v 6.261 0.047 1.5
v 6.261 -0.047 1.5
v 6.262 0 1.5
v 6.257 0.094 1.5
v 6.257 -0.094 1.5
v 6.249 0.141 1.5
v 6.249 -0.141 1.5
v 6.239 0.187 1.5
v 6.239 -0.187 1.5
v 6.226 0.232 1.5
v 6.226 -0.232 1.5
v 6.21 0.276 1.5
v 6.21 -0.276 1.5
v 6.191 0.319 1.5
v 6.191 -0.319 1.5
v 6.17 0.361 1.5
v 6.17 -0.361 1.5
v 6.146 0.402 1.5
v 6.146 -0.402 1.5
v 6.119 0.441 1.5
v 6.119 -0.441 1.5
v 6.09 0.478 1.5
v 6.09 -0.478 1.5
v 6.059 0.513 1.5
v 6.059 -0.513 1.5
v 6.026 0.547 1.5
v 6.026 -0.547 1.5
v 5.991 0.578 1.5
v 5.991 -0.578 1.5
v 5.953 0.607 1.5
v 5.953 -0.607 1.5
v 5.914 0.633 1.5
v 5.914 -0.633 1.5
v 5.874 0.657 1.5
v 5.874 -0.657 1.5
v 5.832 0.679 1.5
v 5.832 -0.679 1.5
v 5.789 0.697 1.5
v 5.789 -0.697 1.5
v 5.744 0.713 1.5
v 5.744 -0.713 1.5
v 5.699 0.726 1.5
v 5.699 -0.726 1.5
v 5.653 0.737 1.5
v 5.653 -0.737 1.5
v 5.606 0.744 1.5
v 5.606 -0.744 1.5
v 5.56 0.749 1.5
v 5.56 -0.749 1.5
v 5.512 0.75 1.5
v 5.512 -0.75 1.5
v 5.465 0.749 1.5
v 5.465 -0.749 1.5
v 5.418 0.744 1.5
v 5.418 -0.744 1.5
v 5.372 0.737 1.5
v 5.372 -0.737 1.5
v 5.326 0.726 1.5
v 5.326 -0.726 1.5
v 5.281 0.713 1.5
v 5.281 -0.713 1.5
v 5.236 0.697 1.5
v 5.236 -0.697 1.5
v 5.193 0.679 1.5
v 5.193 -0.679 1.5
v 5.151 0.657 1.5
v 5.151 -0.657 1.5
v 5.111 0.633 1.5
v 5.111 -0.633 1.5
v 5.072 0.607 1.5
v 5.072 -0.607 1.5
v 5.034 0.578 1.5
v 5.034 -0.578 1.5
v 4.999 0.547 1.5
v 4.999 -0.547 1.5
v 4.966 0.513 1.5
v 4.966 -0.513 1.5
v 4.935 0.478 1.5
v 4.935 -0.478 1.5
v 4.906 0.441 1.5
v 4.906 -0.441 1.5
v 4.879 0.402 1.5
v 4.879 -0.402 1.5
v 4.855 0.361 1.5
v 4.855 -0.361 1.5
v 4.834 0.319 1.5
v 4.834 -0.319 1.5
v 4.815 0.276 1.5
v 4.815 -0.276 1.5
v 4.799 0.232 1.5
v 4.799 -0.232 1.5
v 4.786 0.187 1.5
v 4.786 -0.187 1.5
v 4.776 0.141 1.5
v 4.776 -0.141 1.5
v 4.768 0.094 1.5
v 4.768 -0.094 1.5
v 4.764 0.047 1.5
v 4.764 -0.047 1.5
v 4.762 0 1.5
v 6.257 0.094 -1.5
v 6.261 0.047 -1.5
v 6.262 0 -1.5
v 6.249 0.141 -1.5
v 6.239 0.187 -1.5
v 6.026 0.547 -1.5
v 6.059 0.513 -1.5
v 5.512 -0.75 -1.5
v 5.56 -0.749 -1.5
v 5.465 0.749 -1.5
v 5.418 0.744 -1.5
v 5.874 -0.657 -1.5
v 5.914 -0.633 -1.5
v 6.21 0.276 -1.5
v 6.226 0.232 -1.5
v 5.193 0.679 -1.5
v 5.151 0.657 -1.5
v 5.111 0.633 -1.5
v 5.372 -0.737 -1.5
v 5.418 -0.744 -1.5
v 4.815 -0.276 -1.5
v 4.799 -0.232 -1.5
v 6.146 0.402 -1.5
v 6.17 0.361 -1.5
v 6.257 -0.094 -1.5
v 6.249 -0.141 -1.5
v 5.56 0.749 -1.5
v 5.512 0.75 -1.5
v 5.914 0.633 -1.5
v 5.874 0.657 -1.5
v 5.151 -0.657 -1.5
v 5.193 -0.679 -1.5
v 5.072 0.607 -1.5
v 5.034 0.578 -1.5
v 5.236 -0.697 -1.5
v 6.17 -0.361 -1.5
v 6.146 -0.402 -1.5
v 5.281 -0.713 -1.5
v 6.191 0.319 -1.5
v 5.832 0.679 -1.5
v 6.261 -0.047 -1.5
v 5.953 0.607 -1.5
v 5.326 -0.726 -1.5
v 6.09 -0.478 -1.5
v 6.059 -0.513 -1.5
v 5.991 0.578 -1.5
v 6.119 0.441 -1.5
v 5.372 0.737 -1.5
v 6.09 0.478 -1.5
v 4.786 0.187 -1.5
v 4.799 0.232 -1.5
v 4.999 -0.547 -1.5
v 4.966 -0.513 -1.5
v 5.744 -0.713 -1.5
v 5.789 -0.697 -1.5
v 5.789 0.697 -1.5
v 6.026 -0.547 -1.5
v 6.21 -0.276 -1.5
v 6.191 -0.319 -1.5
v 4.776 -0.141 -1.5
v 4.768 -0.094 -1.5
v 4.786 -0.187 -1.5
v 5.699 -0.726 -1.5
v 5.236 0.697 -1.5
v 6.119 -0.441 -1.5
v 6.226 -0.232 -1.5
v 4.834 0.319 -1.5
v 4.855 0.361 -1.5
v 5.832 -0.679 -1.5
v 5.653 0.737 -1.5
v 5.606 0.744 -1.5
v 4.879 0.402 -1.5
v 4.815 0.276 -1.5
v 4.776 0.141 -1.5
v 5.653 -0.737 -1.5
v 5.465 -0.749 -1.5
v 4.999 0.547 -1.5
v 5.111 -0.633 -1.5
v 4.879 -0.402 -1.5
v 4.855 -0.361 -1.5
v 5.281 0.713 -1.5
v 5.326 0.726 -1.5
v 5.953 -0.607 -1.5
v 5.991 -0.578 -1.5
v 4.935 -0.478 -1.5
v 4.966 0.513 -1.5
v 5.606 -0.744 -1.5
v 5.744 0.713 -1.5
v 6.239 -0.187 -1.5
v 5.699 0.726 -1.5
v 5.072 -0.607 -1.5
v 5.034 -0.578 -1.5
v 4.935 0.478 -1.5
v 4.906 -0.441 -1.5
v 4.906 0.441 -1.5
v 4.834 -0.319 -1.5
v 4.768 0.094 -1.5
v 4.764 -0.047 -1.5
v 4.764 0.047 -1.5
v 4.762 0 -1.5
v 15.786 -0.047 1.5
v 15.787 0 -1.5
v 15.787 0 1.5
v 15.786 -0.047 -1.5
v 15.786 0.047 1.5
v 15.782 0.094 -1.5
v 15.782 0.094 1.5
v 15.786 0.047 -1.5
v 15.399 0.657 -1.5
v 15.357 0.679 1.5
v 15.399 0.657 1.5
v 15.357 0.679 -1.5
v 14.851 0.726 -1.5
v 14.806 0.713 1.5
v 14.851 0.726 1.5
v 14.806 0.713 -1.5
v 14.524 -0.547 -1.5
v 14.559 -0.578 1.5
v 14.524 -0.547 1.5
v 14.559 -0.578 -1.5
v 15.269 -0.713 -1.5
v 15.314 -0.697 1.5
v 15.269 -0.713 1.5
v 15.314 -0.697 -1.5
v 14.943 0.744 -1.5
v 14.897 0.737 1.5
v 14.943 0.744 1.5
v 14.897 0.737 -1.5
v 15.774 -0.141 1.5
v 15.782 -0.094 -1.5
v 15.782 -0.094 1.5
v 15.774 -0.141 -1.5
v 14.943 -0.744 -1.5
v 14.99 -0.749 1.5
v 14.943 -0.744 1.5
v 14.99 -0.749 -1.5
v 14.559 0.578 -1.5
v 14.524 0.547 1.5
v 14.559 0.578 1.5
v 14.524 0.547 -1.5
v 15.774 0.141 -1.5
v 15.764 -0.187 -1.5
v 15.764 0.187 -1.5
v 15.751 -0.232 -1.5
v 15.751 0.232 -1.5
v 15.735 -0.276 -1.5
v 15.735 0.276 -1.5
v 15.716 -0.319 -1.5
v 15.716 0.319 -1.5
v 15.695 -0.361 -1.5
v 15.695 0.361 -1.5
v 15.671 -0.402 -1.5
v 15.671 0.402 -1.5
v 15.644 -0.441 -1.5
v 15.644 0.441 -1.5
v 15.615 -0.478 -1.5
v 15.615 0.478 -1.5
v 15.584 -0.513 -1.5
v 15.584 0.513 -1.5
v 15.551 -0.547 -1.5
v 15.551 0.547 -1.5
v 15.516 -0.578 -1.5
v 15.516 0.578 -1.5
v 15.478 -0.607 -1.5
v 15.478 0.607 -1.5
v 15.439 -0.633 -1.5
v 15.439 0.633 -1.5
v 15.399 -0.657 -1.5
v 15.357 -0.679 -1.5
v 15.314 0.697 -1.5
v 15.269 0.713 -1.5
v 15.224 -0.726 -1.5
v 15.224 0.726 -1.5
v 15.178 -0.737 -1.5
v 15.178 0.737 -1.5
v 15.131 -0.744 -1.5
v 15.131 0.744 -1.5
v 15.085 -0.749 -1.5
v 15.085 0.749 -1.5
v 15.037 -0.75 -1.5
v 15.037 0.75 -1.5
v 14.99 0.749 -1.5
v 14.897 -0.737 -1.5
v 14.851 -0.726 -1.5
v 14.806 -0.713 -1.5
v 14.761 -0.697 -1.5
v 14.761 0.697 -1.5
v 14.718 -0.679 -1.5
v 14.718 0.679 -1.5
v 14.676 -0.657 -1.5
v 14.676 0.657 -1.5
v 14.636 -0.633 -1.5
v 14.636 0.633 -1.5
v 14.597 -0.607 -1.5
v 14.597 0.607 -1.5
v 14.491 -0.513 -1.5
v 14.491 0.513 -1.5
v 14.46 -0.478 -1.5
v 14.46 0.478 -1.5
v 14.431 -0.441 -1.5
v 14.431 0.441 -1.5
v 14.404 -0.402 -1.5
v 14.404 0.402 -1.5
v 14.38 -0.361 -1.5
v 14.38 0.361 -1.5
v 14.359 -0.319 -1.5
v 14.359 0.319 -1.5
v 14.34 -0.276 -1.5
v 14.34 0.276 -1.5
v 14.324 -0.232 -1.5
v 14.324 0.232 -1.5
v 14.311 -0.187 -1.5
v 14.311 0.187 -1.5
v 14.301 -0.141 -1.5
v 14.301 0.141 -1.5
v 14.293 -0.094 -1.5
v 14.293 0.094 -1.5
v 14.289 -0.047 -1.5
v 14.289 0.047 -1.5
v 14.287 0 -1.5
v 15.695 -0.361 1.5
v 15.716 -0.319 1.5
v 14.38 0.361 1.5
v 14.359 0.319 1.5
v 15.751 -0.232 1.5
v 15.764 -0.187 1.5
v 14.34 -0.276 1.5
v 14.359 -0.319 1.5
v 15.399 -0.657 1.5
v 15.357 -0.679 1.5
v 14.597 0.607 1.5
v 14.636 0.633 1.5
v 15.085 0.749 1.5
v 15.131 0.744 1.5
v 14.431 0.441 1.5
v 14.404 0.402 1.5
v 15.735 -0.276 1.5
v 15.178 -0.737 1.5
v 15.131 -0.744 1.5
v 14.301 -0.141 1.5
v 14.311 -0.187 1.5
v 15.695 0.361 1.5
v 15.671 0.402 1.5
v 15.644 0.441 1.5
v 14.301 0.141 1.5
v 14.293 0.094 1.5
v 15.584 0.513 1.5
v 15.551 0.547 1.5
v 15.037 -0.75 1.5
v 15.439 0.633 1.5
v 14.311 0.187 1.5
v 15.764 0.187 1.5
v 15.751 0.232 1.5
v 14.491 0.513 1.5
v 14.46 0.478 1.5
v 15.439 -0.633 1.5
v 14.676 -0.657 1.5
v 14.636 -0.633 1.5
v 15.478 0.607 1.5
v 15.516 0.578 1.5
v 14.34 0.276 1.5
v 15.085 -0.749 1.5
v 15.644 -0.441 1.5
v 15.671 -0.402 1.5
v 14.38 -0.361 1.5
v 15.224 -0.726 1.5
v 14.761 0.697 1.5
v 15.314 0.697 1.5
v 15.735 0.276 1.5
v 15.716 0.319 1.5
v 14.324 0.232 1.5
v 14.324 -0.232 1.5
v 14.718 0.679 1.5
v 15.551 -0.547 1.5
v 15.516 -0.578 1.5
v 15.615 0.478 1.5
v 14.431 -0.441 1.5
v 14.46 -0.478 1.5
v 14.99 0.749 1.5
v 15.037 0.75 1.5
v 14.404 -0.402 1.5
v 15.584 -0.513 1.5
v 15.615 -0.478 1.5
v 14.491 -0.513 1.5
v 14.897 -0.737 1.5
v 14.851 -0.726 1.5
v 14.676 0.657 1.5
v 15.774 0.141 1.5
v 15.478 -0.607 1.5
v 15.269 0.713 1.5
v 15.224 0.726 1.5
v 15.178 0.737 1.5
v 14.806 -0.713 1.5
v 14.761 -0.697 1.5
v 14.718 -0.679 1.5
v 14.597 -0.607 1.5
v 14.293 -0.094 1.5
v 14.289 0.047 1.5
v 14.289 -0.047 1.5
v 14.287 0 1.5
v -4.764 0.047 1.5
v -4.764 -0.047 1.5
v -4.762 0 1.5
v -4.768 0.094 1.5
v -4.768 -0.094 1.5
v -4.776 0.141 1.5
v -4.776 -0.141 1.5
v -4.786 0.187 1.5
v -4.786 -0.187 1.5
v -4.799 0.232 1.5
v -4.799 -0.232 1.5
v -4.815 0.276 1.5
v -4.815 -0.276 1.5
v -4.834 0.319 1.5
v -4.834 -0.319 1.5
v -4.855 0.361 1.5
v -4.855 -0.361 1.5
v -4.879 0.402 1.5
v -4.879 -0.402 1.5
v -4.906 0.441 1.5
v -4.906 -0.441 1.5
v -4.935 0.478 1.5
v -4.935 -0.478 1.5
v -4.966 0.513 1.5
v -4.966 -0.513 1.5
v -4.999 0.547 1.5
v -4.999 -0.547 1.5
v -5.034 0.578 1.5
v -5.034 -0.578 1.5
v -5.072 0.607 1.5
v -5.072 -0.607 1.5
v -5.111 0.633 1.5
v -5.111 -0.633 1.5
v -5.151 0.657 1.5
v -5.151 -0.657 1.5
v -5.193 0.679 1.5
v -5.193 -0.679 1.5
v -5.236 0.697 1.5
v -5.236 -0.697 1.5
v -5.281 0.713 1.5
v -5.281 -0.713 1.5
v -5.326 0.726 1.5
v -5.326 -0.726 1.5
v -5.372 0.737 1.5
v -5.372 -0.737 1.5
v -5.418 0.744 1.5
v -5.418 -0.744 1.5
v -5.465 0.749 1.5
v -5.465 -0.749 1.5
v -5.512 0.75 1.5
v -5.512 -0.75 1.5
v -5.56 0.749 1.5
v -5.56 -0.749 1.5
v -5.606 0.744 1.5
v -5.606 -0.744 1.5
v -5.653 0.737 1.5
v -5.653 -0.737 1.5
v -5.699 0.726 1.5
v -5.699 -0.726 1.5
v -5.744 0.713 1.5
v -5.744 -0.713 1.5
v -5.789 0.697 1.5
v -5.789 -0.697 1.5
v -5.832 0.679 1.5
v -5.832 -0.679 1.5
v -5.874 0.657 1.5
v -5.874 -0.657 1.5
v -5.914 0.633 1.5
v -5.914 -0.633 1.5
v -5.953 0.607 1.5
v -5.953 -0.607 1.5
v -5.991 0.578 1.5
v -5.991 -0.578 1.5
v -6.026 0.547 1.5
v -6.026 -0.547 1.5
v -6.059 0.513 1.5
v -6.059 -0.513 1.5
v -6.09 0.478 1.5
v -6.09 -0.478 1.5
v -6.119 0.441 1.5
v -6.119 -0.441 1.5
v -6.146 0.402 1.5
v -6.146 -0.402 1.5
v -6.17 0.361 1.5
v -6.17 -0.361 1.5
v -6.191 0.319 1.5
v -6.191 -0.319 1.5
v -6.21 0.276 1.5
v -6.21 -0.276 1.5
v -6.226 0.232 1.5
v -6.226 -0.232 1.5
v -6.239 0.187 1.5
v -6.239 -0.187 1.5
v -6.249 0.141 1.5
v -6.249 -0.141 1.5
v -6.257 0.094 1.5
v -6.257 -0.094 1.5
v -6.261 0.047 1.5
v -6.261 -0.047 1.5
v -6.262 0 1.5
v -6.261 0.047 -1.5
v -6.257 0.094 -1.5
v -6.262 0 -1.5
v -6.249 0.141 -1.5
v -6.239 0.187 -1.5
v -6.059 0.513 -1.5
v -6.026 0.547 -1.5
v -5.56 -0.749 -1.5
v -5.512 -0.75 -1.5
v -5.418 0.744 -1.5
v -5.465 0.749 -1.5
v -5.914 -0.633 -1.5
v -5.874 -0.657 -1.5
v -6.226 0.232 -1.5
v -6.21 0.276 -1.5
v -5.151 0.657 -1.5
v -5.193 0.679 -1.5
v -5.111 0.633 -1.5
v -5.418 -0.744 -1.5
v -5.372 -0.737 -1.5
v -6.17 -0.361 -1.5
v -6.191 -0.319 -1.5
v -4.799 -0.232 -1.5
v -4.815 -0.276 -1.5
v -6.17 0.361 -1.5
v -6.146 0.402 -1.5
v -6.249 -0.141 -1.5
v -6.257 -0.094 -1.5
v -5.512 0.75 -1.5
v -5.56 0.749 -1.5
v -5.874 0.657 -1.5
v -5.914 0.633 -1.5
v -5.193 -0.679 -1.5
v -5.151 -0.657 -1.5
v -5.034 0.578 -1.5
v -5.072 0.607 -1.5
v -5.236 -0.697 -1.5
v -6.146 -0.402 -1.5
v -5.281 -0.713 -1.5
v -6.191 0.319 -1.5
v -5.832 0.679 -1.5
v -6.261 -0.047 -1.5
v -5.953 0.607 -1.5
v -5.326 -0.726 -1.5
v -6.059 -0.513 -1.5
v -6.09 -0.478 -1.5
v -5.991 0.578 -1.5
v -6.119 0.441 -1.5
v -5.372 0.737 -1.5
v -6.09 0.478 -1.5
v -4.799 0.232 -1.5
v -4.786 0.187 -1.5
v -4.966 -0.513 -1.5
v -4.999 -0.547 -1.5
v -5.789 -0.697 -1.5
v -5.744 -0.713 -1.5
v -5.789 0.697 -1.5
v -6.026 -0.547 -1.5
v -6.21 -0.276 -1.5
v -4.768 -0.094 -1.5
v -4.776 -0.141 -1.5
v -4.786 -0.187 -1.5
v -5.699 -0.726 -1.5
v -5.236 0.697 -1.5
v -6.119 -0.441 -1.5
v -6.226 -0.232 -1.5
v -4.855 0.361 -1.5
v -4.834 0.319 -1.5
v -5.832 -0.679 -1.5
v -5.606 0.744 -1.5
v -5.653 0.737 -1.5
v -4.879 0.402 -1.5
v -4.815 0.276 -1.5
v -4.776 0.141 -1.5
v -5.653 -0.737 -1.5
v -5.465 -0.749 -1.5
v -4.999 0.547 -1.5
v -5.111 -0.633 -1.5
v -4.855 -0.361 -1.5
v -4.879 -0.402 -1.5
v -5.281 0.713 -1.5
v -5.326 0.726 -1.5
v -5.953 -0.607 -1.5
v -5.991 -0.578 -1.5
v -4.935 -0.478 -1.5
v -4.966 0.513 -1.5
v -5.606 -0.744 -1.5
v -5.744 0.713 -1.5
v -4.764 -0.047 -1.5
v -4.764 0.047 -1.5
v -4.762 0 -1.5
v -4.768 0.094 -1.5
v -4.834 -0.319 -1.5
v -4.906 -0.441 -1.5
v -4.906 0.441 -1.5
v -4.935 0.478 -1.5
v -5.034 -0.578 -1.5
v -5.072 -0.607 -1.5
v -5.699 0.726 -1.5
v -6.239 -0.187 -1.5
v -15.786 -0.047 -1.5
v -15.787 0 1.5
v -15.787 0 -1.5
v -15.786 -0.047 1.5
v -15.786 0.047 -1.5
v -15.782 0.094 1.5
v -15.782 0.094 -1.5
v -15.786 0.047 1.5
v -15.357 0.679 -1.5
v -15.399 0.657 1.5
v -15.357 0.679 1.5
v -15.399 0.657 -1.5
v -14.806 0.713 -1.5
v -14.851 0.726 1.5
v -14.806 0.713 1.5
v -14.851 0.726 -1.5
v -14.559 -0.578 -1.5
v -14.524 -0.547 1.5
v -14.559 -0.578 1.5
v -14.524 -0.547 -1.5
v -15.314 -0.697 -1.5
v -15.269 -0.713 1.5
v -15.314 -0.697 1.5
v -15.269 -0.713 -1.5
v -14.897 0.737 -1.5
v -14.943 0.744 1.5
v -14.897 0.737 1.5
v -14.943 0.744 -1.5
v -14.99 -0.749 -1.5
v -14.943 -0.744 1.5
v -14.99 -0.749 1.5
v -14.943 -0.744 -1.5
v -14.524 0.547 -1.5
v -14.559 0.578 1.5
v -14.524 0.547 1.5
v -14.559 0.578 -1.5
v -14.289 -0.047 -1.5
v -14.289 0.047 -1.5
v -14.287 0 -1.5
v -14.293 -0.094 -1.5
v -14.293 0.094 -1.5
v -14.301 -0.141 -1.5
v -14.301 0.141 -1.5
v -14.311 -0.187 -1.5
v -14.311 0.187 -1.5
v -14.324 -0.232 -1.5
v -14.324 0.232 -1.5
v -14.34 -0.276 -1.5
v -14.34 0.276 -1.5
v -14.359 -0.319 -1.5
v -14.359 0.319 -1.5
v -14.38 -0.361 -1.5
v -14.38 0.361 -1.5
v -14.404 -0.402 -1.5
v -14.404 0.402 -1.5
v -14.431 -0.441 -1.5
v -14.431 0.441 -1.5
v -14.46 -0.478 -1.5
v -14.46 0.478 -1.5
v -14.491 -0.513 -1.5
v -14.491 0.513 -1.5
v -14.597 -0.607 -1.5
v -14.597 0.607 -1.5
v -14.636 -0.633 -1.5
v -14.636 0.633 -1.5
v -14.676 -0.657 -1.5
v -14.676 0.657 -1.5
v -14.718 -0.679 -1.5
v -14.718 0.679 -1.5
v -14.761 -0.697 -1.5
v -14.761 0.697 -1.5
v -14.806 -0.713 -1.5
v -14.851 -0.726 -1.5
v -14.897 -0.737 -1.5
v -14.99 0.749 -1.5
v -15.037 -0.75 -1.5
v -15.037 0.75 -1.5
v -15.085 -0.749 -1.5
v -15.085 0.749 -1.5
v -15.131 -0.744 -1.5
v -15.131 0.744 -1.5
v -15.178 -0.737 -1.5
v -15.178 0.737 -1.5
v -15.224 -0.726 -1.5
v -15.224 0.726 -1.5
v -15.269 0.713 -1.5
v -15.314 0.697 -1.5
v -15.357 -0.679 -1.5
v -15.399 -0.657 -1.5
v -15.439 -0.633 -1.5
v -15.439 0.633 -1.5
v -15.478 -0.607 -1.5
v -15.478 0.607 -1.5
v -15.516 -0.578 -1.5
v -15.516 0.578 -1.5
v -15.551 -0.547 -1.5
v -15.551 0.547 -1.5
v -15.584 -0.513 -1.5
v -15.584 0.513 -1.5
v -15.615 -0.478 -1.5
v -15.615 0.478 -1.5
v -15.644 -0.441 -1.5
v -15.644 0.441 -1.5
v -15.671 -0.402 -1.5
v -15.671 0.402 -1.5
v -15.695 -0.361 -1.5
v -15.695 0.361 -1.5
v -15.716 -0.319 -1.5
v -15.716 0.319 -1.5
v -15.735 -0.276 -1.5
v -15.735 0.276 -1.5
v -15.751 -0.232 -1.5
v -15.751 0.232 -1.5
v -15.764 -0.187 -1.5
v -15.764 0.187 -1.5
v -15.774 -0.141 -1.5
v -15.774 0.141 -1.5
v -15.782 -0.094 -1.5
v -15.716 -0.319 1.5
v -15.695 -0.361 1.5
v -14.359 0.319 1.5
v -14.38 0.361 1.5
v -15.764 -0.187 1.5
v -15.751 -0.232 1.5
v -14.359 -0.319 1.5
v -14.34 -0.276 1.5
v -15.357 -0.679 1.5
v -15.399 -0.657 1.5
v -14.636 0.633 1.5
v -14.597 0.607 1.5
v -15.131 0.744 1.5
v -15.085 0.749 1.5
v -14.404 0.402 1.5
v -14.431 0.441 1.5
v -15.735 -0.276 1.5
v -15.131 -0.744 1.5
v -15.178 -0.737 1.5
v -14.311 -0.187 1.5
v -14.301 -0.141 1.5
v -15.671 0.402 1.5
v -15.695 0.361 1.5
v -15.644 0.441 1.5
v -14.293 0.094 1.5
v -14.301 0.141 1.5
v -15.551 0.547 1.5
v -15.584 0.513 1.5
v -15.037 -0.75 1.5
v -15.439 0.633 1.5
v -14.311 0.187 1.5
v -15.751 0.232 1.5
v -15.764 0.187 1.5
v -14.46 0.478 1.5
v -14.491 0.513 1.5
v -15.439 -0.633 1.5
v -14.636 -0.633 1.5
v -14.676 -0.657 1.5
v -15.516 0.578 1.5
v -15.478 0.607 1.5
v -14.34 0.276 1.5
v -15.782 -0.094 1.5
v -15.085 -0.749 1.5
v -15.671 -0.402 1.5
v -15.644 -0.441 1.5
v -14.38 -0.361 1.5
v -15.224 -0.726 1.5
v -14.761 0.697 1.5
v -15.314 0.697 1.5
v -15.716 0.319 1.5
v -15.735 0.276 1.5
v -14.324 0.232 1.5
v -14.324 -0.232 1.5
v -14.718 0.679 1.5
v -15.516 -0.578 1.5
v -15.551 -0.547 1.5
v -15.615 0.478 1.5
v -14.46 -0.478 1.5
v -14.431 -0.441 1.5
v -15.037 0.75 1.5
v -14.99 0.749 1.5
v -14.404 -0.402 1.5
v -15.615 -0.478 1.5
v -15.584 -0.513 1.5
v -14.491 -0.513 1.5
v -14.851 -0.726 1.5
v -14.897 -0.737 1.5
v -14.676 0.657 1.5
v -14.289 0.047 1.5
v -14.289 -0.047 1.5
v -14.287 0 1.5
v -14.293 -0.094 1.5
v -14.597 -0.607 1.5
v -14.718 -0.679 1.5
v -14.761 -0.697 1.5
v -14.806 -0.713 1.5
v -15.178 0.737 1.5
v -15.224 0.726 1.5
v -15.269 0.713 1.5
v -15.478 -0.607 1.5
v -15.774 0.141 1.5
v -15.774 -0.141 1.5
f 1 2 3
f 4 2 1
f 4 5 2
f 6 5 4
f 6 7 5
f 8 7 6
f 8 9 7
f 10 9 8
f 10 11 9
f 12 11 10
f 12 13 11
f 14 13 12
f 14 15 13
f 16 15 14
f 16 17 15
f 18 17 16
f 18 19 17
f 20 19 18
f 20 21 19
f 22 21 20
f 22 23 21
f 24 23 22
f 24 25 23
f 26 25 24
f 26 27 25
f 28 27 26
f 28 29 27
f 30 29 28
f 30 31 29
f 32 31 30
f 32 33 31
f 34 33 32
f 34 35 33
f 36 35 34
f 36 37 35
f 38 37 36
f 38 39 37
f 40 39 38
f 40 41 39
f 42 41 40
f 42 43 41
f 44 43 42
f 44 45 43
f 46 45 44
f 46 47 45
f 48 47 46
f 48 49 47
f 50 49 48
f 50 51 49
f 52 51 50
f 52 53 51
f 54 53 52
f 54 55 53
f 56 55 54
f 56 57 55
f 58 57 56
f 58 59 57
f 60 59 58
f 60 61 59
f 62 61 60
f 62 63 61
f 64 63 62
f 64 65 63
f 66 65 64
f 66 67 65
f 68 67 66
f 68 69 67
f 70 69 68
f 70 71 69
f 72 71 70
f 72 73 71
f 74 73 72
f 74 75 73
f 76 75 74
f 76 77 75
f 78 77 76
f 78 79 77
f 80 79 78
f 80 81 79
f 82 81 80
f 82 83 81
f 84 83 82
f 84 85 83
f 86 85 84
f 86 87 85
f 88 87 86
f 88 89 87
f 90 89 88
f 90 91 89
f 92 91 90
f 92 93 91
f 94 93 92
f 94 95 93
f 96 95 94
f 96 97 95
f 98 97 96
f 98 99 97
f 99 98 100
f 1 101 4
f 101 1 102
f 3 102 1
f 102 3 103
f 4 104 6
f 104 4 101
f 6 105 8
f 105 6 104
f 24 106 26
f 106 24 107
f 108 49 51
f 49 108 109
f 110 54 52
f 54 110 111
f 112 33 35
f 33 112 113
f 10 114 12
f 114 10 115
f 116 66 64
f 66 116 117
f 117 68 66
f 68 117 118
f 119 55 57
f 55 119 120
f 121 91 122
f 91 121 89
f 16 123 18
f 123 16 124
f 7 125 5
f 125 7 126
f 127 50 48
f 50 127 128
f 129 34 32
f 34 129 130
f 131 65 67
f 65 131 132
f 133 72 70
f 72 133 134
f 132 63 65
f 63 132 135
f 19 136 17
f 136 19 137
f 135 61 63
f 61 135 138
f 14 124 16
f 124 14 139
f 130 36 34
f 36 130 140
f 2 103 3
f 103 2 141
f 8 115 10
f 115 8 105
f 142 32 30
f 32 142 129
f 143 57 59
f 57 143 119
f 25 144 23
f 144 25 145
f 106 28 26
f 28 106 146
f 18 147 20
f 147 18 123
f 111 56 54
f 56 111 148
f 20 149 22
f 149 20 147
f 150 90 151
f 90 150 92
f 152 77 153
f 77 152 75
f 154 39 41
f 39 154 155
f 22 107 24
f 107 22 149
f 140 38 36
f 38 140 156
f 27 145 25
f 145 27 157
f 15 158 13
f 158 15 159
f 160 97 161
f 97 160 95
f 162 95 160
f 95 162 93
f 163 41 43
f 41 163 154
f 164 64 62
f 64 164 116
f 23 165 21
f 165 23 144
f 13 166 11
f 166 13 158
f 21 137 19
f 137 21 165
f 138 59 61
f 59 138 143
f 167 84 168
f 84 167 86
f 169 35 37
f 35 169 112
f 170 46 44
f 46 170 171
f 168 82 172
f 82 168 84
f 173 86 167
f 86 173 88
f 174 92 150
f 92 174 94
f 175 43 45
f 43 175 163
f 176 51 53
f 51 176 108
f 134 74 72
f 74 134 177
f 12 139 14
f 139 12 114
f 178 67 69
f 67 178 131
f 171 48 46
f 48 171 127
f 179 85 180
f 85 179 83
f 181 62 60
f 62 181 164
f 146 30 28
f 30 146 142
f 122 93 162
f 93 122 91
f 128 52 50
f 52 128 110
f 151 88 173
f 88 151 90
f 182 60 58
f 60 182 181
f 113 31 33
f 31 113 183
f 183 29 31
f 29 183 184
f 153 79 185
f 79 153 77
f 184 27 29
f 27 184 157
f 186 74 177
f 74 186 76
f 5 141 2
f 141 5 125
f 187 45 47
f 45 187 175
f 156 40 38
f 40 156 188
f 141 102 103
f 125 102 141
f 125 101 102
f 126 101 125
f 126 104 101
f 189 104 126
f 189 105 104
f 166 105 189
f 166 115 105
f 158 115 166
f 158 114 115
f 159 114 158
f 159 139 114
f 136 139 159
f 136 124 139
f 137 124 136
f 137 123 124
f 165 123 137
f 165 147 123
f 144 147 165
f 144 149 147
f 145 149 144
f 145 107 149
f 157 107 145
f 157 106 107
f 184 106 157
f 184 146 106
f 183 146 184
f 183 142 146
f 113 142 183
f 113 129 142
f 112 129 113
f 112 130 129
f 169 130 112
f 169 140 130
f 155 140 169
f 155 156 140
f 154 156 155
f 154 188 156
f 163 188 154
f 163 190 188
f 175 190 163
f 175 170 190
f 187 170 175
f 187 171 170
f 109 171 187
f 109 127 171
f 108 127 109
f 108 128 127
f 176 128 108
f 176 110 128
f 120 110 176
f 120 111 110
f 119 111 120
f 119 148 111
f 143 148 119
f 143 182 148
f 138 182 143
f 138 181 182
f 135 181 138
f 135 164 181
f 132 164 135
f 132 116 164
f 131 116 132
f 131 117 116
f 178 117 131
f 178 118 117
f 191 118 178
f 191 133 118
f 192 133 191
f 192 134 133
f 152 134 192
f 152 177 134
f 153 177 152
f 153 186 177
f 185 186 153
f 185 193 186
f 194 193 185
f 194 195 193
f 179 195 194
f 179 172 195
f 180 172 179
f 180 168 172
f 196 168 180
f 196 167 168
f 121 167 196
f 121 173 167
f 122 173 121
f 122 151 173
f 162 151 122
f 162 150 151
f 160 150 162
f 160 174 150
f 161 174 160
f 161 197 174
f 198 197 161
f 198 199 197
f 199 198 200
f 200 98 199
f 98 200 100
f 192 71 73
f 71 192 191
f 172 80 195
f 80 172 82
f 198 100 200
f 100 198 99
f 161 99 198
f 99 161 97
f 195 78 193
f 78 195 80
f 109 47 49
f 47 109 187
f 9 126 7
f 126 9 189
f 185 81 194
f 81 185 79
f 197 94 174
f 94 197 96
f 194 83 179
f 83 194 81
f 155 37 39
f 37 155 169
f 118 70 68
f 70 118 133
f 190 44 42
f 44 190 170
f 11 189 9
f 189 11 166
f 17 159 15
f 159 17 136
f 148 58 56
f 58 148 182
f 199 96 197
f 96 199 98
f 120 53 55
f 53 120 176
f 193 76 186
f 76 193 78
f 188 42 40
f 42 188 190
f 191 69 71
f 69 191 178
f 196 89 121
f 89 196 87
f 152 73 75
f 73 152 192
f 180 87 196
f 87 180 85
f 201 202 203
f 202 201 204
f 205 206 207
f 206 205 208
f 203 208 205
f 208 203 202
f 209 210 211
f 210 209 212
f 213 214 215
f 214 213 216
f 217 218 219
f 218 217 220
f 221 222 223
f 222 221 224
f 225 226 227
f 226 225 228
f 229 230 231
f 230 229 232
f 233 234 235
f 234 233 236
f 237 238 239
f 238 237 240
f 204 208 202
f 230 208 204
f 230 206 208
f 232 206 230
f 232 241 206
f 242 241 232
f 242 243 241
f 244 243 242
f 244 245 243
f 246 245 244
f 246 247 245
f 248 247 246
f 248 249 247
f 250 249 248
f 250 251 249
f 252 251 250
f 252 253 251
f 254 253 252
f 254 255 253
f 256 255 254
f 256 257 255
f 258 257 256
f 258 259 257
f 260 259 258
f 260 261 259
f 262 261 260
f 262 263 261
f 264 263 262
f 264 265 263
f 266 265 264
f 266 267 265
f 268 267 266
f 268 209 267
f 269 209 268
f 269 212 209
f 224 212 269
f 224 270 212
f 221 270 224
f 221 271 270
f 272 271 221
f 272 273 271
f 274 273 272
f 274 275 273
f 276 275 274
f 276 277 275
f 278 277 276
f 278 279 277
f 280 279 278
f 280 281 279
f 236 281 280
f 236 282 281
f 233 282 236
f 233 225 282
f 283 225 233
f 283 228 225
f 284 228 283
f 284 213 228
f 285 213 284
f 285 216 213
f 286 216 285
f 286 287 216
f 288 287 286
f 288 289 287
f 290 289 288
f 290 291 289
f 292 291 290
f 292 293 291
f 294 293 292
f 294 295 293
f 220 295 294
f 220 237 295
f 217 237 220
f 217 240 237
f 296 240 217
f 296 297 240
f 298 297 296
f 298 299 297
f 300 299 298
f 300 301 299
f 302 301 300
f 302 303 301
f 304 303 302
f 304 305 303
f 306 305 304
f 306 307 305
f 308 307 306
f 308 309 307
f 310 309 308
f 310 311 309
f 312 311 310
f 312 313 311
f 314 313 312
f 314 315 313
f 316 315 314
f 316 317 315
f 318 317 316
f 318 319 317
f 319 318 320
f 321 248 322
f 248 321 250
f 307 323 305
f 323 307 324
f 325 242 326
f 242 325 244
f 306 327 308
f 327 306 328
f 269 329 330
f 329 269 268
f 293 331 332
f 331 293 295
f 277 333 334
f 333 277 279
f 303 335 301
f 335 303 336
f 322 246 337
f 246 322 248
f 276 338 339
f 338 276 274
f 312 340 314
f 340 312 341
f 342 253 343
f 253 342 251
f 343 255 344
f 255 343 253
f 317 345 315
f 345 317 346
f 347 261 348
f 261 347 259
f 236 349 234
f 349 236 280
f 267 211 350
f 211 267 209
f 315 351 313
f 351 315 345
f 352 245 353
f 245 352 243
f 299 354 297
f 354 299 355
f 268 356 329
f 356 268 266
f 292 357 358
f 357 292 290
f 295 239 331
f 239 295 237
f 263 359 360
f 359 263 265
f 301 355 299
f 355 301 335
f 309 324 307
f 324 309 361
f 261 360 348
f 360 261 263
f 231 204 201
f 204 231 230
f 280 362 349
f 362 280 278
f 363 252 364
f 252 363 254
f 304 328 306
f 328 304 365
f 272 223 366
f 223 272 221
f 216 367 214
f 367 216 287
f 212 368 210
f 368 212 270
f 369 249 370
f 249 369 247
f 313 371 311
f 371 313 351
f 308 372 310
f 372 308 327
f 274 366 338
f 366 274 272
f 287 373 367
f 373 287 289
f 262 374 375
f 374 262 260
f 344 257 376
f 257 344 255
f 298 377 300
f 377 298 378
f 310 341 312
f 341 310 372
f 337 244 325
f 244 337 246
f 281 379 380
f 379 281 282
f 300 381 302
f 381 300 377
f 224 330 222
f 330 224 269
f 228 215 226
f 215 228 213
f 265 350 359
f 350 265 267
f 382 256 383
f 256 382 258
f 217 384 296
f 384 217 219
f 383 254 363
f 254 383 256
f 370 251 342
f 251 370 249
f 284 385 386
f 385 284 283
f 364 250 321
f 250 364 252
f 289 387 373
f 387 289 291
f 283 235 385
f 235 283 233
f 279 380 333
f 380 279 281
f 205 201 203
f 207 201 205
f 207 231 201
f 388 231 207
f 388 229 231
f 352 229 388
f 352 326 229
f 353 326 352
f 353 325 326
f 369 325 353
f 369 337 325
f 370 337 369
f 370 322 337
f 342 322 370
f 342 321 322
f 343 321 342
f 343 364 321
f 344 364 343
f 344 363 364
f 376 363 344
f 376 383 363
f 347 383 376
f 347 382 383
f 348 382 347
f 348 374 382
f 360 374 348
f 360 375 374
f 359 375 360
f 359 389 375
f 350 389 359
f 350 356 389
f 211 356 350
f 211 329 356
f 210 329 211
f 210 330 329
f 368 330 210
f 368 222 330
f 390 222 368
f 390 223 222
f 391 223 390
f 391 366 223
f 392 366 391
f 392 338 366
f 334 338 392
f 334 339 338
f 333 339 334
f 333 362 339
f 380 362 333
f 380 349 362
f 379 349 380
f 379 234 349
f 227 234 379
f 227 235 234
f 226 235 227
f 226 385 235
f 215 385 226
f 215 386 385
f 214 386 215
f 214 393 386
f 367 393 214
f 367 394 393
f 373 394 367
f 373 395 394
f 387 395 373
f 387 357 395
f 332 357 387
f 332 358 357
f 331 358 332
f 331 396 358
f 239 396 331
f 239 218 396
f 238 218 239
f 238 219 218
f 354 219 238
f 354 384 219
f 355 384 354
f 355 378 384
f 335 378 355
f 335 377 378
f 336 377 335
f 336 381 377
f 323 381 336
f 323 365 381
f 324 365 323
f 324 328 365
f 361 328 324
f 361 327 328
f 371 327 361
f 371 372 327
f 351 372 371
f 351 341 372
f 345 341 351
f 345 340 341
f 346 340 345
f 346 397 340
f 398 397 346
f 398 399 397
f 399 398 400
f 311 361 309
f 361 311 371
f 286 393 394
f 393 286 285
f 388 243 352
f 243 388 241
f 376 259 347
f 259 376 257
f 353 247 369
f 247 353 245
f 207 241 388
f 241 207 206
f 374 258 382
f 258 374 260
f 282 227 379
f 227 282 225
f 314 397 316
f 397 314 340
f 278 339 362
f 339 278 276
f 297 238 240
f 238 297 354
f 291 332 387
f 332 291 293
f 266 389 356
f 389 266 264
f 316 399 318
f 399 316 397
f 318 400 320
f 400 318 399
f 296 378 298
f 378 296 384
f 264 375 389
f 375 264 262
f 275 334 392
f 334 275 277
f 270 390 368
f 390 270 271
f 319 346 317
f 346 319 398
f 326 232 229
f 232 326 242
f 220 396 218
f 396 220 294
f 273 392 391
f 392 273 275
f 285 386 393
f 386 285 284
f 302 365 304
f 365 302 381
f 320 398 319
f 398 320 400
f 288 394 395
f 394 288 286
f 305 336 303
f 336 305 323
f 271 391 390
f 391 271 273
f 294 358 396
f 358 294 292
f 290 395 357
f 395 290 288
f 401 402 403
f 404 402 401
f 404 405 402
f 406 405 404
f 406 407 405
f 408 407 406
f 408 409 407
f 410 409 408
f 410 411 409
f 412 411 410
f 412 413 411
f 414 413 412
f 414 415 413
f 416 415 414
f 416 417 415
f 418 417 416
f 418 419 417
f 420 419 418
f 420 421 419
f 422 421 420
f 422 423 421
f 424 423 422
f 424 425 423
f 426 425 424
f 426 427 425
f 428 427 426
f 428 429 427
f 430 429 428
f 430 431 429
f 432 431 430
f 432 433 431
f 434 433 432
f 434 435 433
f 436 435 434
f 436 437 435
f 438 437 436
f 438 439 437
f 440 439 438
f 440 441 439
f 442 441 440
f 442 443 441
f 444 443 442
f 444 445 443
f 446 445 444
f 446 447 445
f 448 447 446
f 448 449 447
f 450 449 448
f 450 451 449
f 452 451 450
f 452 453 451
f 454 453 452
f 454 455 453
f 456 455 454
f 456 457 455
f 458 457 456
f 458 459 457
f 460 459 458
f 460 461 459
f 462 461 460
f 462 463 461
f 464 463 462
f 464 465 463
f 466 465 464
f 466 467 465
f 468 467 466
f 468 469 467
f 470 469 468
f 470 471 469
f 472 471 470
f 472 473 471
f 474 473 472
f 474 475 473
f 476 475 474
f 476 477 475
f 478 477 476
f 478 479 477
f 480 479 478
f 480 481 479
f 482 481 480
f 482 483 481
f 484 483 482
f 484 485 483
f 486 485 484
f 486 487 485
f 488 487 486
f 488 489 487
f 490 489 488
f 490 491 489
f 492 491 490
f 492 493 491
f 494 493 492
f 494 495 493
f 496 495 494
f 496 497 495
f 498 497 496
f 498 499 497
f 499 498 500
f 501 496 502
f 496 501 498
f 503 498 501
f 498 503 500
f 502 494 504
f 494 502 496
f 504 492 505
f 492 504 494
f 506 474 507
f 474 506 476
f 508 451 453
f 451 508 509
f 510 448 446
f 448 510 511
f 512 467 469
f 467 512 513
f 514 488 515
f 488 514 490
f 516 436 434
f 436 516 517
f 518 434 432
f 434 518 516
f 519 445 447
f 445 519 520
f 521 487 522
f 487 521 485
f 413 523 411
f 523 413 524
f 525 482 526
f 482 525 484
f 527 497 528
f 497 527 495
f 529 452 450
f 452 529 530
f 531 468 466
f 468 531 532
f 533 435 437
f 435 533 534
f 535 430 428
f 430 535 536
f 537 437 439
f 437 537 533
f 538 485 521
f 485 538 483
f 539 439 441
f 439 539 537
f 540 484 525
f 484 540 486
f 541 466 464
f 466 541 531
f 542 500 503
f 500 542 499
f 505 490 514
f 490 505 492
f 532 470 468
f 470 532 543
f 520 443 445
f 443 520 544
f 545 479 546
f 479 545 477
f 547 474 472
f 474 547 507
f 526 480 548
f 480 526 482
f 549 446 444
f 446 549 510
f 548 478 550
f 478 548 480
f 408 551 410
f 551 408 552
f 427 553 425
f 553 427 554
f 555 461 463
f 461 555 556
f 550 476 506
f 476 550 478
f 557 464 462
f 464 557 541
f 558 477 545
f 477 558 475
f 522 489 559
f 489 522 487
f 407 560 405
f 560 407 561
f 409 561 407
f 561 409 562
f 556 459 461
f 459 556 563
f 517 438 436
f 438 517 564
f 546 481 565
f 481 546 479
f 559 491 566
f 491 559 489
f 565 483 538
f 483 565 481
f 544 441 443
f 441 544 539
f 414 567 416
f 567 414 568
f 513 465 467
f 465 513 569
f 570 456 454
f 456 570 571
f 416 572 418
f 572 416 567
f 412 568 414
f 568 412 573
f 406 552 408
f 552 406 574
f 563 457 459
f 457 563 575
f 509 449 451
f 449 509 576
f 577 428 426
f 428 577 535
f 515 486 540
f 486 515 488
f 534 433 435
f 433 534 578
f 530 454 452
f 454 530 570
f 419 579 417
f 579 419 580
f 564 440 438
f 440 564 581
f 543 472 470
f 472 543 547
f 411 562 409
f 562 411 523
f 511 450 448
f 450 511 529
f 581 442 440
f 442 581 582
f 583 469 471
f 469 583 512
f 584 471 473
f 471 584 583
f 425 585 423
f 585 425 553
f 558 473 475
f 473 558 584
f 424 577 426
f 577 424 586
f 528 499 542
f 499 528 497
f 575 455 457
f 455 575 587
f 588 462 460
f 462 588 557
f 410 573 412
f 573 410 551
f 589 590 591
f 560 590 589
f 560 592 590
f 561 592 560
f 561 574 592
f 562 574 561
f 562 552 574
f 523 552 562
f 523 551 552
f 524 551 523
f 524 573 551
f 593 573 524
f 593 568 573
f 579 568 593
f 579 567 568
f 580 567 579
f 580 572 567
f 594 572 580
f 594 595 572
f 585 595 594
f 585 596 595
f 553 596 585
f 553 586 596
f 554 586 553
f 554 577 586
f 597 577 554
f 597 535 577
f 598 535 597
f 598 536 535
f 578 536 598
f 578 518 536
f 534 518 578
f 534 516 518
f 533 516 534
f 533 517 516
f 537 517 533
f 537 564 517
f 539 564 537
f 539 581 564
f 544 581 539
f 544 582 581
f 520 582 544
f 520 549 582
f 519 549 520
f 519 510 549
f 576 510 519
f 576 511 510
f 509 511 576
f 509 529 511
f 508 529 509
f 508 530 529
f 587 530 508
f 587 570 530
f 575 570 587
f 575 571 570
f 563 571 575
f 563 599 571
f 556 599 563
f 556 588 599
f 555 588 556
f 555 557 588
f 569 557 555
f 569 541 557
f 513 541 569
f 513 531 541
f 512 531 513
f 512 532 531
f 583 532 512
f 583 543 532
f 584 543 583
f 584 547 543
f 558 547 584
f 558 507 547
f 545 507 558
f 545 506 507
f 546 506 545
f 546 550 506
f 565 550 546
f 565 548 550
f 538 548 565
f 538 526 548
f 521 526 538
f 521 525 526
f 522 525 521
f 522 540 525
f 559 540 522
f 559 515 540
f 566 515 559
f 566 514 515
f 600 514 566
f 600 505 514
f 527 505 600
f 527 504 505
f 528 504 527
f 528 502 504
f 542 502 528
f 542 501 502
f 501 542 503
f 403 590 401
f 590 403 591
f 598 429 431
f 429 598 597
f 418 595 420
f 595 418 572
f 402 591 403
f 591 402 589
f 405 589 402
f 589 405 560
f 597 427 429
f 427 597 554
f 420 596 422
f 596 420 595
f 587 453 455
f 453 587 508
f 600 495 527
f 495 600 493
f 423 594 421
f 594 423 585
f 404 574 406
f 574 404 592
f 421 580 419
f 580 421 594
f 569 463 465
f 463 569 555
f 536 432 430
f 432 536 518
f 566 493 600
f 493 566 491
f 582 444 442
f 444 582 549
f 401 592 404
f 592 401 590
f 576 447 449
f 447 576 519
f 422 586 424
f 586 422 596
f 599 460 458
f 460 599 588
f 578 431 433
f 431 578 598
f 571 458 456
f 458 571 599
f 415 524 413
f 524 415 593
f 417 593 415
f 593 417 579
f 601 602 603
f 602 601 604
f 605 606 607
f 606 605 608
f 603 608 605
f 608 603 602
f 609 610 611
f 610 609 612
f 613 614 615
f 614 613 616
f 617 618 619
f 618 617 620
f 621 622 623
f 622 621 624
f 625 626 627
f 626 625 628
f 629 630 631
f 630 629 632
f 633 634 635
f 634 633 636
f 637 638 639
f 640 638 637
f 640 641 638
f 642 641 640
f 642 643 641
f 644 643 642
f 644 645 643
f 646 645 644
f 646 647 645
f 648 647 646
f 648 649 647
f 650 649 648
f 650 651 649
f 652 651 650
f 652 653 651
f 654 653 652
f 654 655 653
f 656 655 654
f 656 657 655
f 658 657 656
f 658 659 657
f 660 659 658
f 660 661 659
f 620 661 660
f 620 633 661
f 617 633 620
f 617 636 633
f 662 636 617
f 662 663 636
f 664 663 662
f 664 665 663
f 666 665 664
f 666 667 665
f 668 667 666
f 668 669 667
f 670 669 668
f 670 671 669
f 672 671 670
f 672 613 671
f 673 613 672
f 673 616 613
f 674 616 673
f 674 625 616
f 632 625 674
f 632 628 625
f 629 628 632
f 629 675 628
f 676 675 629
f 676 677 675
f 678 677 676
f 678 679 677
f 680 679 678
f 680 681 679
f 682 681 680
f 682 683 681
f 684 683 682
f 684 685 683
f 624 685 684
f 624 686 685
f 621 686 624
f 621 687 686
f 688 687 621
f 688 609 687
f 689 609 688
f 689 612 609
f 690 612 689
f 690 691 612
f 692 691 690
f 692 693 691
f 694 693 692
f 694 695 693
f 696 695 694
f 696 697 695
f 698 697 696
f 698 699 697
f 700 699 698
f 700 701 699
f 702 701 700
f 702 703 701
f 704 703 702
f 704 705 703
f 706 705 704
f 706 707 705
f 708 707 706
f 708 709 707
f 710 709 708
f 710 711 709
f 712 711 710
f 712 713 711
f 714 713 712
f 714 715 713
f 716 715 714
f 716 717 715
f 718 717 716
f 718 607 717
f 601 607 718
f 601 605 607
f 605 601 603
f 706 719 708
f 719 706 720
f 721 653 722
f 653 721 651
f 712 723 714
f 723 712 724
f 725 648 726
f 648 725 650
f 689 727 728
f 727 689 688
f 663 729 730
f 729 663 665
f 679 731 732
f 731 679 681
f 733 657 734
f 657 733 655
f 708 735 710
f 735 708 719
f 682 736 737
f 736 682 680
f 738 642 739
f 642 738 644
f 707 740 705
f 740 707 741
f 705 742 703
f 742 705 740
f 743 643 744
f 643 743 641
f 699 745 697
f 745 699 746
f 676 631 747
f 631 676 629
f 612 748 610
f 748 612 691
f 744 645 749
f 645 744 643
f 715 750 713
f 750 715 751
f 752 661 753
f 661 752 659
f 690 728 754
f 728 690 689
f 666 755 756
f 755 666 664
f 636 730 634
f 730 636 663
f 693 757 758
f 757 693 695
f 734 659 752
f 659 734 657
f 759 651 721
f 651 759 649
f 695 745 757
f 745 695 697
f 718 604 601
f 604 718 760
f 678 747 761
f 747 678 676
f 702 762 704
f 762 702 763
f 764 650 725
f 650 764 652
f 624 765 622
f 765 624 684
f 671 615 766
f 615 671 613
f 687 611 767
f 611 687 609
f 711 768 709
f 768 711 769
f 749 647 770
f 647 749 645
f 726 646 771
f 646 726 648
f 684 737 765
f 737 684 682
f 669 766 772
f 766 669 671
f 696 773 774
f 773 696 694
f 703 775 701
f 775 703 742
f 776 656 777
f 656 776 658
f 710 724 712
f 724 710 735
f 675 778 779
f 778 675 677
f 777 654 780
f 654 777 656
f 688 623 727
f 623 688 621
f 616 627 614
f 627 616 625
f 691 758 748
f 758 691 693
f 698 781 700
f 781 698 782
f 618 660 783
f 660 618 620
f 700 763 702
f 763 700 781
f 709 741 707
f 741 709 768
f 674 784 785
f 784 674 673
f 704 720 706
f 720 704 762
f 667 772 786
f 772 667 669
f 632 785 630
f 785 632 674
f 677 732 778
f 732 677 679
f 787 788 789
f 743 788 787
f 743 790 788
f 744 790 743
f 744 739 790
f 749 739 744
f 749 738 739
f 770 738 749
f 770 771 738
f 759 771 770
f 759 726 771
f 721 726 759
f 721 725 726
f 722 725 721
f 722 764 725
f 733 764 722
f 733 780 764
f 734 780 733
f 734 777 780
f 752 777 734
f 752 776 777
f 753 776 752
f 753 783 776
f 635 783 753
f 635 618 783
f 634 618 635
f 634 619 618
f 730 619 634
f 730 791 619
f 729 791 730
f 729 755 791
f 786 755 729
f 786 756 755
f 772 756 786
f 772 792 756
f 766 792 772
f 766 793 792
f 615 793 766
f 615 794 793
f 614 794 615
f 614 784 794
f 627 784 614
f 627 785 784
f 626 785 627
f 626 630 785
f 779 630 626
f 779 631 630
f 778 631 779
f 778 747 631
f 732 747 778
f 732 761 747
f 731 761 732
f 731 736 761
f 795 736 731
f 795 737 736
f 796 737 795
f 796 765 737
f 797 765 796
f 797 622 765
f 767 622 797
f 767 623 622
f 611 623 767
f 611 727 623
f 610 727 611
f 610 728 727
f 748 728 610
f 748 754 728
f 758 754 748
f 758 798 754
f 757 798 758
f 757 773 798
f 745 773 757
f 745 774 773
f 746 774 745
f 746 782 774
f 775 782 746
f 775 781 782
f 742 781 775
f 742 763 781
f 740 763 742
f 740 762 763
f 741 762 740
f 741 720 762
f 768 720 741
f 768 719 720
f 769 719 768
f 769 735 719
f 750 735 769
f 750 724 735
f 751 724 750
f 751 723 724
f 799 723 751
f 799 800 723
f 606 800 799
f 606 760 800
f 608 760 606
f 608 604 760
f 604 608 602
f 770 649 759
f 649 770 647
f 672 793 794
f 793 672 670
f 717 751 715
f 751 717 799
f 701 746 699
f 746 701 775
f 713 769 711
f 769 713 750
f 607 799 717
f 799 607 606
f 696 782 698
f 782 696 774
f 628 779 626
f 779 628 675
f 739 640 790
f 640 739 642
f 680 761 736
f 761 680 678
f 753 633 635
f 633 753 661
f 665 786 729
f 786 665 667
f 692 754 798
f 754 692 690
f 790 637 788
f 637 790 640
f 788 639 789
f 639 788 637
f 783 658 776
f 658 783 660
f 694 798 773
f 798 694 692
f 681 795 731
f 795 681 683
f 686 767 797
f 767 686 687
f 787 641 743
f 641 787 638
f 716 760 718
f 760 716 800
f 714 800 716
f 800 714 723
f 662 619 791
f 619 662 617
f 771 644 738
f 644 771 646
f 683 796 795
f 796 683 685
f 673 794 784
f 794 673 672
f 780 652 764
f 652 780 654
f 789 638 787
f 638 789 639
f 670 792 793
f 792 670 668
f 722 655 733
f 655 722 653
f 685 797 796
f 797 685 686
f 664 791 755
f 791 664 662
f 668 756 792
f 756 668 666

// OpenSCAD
// file: functions.scad
function fretDistance(fret, scaleLength) =
    scaleLength - scaleLength / pow(2, fret / 12);

function lerp(a, b, x) =
    a + (b - a) * x;
// file: config.scad
use <functions.scad>;

$fn = 100;

// Body
// ----

// X, Y, Roundness
bodyTop = [0, 170, 40];
bodyBottom = [0, -60, 60];
lowerBout = [85, 0, 30];
upperBout = [65, 130, 30];
waist = [55, 80, 30];

bodyLength = [bodyTop[1] - bodyBottom[1]];
maxBodyWidth = [2 * lowerBout[2]];
bodyDepth = 50;

soundboardThickness = 1.8;
backThickness = 1.8;
sideThickness = 1.8;

sideDepth = bodyDepth - backThickness - soundboardThickness;

// Kerf
// ----

useKerf = true;
kerfWidth = 5;
kerfHeight = 10;

// Neck
// ----

neckWidthNarrow = 35;
neckWidthWide = 45;
neckDepthNarrow = 10;
neckDepthWide = 16;

// Heel
// ----

heelWidth = 10;
heelLength = 30;

// Heel Block
// ----------

heelBlockWidth = 30;
heelBlockDepth = 10;

// Heel Dovetail
// -------------

heelDovetailWidth = neckWidthWide - 20;
heelDovetailHeight = sideDepth + soundboardThickness - 10;
heelDovetailDepth = 10;
heelDovetailOffset = 5;
heelDovetailTaper = 1.1;

// Nut
// ---

nutWidth = 4;

pinHeight = 3;
pinRadius = 0.75;
stringSpacing = 9.525;

// Fingerboard
// -----------

scaleLength = 340;
numberOfFrets = 16;

fretWidth = 1.35;
fretDepth = 0.94;
maxFretLength = neckWidthWide;

fingerboardLength = fretDistance(numberOfFrets, scaleLength) + fretWidth + nutWidth;
maxFingerboardWidth = neckWidthWide;
fingerboardDepth = 6;

fingerboardSlopeRadius = 1;

fretFileAngle = 70;

// Beziers
// -------
topUpperBoutBezier = [
    [bodyTop[0], bodyTop[1]],
    [bodyBottom[0] + bodyTop[2], bodyTop[1]],
    [upperBout[0], upperBout[1] + upperBout[2]],
    [upperBout[0], upperBout[1]],
];

upperBoutWaistBezier = [
    [upperBout[0], upperBout[1]],
    [upperBout[0], upperBout[1] - upperBout[2]],
    [waist[0], waist[1] + waist[2]],
    [waist[0], waist[1]]
];

waistLowerBoutBezier = [
    [waist[0], waist[1]],
    [waist[0], waist[1] - waist[2]],
    [lowerBout[0], lowerBout[1] + lowerBout[2]],
    [lowerBout[0], lowerBout[1]]
];

lowerBoutBottomBezier = [
    [lowerBout[0], lowerBout[1]],
    [lowerBout[0], lowerBout[1] - lowerBout[2]],
    [bodyBottom[0] + bodyBottom[2], bodyBottom[1]],
    [bodyBottom[0], bodyBottom[1]]
];
// main file
include <config.scad>;

module halfNut() {
    translate([0.5 * stringSpacing + pinRadius, 0, 0])
        cylinder(pinHeight, r=pinRadius, center=true);
    translate([1.5 * stringSpacing + pinRadius, 0, 0])
        cylinder(pinHeight, r=pinRadius, center=true);
}

module nut() {
    halfNut(pinHeight, pinRadius, stringSpacing);
    mirror([1, 0, 0])
        halfNut(pinHeight, pinRadius, stringSpacing);
}

nut(pinHeight, pinRadius, stringSpacing);
